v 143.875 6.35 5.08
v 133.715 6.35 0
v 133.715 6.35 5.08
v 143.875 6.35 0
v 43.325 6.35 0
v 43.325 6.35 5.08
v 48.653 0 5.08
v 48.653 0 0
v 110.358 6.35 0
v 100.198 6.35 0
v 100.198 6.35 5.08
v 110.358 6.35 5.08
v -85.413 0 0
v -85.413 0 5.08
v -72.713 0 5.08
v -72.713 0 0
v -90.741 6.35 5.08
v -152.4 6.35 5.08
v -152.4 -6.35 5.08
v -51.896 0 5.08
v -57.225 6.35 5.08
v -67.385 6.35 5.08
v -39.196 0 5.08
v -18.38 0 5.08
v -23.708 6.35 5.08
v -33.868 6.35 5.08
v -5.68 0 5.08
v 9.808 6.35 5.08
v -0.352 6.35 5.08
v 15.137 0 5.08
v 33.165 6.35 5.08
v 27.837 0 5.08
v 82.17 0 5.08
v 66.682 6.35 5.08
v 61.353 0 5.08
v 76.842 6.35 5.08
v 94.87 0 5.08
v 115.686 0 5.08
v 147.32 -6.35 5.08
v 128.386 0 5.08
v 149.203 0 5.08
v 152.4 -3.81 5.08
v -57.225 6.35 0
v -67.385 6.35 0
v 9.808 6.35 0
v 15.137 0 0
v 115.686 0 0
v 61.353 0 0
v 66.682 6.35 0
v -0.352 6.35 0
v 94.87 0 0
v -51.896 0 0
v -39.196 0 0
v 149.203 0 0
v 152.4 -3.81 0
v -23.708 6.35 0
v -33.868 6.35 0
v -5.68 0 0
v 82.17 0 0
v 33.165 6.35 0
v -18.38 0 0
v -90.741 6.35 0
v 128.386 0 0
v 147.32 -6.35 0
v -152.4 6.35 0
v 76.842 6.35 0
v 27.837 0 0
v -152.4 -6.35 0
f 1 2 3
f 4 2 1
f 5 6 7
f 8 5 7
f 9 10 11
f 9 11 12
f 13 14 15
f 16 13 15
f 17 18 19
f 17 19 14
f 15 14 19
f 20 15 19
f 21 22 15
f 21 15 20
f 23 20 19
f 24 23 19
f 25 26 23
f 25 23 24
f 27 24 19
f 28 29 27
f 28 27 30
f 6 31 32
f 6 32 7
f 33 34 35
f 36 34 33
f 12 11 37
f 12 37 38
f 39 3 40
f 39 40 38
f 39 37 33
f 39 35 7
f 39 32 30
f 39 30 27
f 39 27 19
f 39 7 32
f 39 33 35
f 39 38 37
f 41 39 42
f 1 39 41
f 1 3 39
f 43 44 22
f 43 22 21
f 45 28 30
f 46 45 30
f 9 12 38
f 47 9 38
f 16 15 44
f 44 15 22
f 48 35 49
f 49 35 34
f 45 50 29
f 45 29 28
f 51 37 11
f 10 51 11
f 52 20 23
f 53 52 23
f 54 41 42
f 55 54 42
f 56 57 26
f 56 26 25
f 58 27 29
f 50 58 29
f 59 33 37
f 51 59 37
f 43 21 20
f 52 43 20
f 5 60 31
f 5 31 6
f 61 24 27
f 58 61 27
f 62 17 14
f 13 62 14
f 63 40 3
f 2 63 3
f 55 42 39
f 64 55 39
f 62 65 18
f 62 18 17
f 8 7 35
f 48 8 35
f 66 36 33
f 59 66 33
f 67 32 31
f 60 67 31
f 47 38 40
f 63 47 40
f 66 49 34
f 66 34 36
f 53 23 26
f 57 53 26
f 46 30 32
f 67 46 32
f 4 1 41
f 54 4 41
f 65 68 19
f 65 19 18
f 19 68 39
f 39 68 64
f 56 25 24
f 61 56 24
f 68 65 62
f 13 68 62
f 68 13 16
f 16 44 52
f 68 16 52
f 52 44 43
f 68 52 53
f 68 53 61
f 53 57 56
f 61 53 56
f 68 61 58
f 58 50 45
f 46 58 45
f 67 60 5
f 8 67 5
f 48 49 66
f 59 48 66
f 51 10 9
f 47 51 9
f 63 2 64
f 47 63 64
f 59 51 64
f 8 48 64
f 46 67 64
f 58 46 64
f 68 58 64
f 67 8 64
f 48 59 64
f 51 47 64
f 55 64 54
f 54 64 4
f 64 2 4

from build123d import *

# Parameters (mm, degrees)
SKETCH1_W           = 304.8
SKETCH1_H           = 12.7
BOSS_EXTRUDE1_DEPTH = 5.08
CUT_EXTRUDE1_DEPTH  = 153.616804121


with BuildPart() as part:
    # Sketch1 → Boss-Extrude1 (new body)
    with BuildSketch(Plane.XY):
        Rectangle(SKETCH1_W, SKETCH1_H)
    extrude(amount=BOSS_EXTRUDE1_DEPTH)

    # Sketch2 → Cut-Extrude1 (cut, through all)
    with BuildSketch(Plane.XY.offset(5.08)):
        Polygon((115.686465089, 0), (128.386465089, 0), (133.714747747, 6.35), (110.358182431, 6.35), align=None)
        Polygon((149.203030405, 0), (152.4, 0), (152.4, 6.35), (143.874747747, 6.35), align=None)
        Polygon((149.203030405, 0), (152.4, -3.81), (152.4, 0), align=None)
        Polygon((152.4, -3.81), (147.32, -6.35), (152.4, -6.35), align=None)
        Polygon((82.169899773, 0), (94.869899773, 0), (100.198182431, 6.35), (76.841617115, 6.35), align=None)
        Polygon((48.653334457, 0), (61.353334457, 0), (66.681617115, 6.35), (43.325051799, 6.35), align=None)
        Polygon((9.808486483, 6.35), (15.136769141, 0), (27.836769141, 0), (33.165051799, 6.35), align=None)
        Polygon((-23.708078833, 6.35), (-18.379796175, 0), (-5.679796175, 0), (-0.351513517, 6.35), align=None)
        Polygon((-57.224644148, 6.35), (-51.89636149, 0), (-39.19636149, 0), (-33.868078833, 6.35), align=None)
        Polygon((-90.741209464, 6.35), (-85.412926806, 0), (-72.712926806, 0), (-67.384644148, 6.35), align=None)
    extrude(amount=-CUT_EXTRUDE1_DEPTH, mode=Mode.SUBTRACT)


solid = part.part
